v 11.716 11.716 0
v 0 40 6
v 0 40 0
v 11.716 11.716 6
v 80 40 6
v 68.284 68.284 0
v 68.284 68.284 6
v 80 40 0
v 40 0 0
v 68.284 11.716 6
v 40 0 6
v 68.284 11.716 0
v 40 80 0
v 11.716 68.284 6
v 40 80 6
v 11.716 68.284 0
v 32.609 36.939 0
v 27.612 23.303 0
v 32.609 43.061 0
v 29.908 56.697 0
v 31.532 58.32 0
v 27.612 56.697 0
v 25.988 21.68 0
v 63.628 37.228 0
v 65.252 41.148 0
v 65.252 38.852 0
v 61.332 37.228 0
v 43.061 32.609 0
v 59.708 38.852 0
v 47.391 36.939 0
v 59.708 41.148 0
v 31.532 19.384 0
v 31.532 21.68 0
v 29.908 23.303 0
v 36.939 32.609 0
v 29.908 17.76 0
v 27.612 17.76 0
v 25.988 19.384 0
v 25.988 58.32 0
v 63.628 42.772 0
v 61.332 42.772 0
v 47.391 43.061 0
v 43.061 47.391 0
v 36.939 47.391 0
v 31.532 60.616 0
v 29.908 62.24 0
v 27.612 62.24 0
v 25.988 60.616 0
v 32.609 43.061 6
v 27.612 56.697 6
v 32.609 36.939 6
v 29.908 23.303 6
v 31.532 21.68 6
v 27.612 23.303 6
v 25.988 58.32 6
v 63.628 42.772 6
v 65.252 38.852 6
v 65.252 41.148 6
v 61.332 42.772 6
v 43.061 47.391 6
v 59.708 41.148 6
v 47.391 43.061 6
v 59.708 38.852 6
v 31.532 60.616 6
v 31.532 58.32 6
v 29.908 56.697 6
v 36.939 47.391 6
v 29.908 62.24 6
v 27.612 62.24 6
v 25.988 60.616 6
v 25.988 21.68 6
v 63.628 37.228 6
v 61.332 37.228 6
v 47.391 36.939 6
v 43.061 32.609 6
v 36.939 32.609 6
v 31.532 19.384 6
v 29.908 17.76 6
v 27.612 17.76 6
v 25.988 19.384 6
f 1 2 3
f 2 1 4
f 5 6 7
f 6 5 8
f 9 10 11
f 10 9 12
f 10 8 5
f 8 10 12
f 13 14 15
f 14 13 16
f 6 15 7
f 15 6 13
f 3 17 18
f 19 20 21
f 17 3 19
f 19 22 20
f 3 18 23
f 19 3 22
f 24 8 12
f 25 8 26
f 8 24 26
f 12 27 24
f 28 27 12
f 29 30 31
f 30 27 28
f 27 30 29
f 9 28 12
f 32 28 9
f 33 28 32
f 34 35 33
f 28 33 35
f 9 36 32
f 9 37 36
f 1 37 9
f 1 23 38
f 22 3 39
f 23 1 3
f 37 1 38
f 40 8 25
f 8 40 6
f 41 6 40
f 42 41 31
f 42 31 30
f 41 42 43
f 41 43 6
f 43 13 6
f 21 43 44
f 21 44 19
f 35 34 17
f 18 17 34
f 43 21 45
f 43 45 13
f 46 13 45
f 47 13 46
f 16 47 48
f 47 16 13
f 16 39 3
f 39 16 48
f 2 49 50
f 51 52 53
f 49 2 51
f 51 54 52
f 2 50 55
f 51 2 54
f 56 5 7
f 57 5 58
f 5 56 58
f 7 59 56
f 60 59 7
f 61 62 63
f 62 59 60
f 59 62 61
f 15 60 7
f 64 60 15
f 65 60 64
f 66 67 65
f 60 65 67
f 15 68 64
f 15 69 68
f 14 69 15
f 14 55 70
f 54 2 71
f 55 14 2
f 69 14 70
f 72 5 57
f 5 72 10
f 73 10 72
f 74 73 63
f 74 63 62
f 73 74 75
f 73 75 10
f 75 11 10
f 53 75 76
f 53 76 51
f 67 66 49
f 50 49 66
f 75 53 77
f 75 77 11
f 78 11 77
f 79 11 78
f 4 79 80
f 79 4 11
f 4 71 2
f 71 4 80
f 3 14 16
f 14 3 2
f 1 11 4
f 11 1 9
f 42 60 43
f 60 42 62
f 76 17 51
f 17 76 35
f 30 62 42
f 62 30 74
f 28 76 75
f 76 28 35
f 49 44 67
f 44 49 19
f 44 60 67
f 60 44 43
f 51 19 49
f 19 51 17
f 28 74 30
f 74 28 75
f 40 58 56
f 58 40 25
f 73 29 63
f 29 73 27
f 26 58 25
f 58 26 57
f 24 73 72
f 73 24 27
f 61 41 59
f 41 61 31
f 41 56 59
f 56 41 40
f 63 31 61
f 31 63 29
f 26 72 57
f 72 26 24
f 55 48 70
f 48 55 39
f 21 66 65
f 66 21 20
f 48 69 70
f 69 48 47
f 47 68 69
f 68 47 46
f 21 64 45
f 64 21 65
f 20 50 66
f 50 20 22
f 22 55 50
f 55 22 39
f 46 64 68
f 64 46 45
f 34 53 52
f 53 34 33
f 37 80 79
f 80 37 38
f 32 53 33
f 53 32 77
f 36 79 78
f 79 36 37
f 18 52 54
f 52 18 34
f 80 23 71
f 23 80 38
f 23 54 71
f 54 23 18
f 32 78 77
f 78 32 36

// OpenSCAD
$fn = 32;

// ----------------------------------------------------------------------
// Polygon plate: 8-gon R40, 3 bolt windows
// ----------------------------------------------------------------------

// --- parameters (mm) ---
sides = 8;                // number of polygon sides
plate_r = 40;             // circumscribed radius of the polygon
bore_r = 8;               // centre bore radius
bolts = 3;                // number of bolt windows
ring_r = 22.48;           // bolt-circle radius
bolt_r = 3;               // bolt window radius
plate_t = 6;              // plate thickness, Z (extrusion height)

plate_d = 2 * plate_r;  // circumscribed diameter
bore_d = 2 * bore_r;  // centre bore diameter
bolt_d = 2 * bolt_r;  // bolt window diameter
ring_d = 2 * ring_r;  // bolt-circle diameter

profile = [[80, 40], [68.284, 68.284], [40, 80], [11.716, 68.284], [0, 40], [11.716, 11.716], [40, 0], [68.284, 11.716]];  // primary outline, 8 points, counter clockwise
void_1 = [[47.391, 43.061], [43.061, 47.391], [36.939, 47.391], [32.609, 43.061], [32.609, 36.939], [36.939, 32.609], [43.061, 32.609], [47.391, 36.939]];  // centre bore, 8 points
void_2 = [[65.252, 41.148], [63.628, 42.772], [61.332, 42.772], [59.708, 41.148], [59.708, 38.852], [61.332, 37.228], [63.628, 37.228], [65.252, 38.852]];  // bolt window 1, 8 points
void_3 = [[31.532, 60.616], [29.908, 62.24], [27.612, 62.24], [25.988, 60.616], [25.988, 58.32], [27.612, 56.697], [29.908, 56.697], [31.532, 58.32]];  // bolt window 2, 8 points
void_4 = [[31.532, 21.68], [29.908, 23.303], [27.612, 23.303], [25.988, 21.68], [25.988, 19.384], [27.612, 17.76], [29.908, 17.76], [31.532, 19.384]];  // bolt window 3, 8 points

// --- the one profile operation ---
difference() {
  linear_extrude(height = plate_t) polygon(points = profile);
  translate([0, 0, -1])
    linear_extrude(height = plate_t + 2) polygon(points = void_1);
  translate([0, 0, -1])
    linear_extrude(height = plate_t + 2) polygon(points = void_2);
  translate([0, 0, -1])
    linear_extrude(height = plate_t + 2) polygon(points = void_3);
  translate([0, 0, -1])
    linear_extrude(height = plate_t + 2) polygon(points = void_4);
}
